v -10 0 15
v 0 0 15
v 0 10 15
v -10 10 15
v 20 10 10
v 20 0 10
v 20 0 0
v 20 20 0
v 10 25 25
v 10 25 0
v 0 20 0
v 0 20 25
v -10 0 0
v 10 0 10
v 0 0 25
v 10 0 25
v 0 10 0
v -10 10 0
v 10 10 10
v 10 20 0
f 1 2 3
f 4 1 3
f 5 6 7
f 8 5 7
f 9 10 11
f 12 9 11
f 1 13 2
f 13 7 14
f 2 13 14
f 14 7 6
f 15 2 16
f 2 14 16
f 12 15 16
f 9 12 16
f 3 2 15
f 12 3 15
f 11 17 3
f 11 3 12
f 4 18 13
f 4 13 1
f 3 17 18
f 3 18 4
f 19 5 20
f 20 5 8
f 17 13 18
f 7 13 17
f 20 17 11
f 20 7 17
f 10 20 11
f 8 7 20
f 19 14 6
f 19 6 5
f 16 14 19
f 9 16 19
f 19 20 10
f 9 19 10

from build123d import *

# Parameters (mm, degrees)
SKETCH1_W           = 10
SKETCH1_H           = 25
BOSS_EXTRUDE1_DEPTH = 25
SKETCH2_W           = 10
SKETCH2_H           = 20
BOSS_EXTRUDE2_DEPTH = 10
CUT_EXTRUDE1_DEPTH  = 40
CUT_EXTRUDE2_DEPTH  = 10
SKETCH5_W           = 15
SKETCH5_H           = 10
BOSS_EXTRUDE3_DEPTH = 10


with BuildPart() as part:
    # Sketch1 → Boss-Extrude1 (new body)
    with BuildSketch(Plane.XY):
        with Locations((5, 12.5)):
            Rectangle(SKETCH1_W, SKETCH1_H)
    extrude(amount=BOSS_EXTRUDE1_DEPTH)

    # Sketch2 → Boss-Extrude2 (add)
    with BuildSketch(Plane(origin=(10, 0, 0), x_dir=(0, 0, -1), z_dir=(1, 0, 0))):
        with Locations((-5, 10)):
            Rectangle(SKETCH2_W, SKETCH2_H)
    extrude(amount=BOSS_EXTRUDE2_DEPTH)

    # Sketch3 → Cut-Extrude1 (cut)
    with BuildSketch(Plane.XY.offset(25)):
        Polygon((10, 25), (0, 20), (0, 25), align=None)
    extrude(amount=-CUT_EXTRUDE1_DEPTH, mode=Mode.SUBTRACT)

    # Sketch4 → Cut-Extrude2 (cut)
    with BuildSketch(Plane(origin=(20, 0, 0), x_dir=(0, 0, -1), z_dir=(1, 0, 0))):
        Polygon((-10, 10), (0, 20), (-10, 20), align=None)
    extrude(amount=-CUT_EXTRUDE2_DEPTH, mode=Mode.SUBTRACT)

    # Sketch5 → Boss-Extrude3 (add)
    with BuildSketch(Plane.ZY):
        with Locations((7.5, 5)):
            Rectangle(SKETCH5_W, SKETCH5_H)
    extrude(amount=BOSS_EXTRUDE3_DEPTH)


solid = part.part
